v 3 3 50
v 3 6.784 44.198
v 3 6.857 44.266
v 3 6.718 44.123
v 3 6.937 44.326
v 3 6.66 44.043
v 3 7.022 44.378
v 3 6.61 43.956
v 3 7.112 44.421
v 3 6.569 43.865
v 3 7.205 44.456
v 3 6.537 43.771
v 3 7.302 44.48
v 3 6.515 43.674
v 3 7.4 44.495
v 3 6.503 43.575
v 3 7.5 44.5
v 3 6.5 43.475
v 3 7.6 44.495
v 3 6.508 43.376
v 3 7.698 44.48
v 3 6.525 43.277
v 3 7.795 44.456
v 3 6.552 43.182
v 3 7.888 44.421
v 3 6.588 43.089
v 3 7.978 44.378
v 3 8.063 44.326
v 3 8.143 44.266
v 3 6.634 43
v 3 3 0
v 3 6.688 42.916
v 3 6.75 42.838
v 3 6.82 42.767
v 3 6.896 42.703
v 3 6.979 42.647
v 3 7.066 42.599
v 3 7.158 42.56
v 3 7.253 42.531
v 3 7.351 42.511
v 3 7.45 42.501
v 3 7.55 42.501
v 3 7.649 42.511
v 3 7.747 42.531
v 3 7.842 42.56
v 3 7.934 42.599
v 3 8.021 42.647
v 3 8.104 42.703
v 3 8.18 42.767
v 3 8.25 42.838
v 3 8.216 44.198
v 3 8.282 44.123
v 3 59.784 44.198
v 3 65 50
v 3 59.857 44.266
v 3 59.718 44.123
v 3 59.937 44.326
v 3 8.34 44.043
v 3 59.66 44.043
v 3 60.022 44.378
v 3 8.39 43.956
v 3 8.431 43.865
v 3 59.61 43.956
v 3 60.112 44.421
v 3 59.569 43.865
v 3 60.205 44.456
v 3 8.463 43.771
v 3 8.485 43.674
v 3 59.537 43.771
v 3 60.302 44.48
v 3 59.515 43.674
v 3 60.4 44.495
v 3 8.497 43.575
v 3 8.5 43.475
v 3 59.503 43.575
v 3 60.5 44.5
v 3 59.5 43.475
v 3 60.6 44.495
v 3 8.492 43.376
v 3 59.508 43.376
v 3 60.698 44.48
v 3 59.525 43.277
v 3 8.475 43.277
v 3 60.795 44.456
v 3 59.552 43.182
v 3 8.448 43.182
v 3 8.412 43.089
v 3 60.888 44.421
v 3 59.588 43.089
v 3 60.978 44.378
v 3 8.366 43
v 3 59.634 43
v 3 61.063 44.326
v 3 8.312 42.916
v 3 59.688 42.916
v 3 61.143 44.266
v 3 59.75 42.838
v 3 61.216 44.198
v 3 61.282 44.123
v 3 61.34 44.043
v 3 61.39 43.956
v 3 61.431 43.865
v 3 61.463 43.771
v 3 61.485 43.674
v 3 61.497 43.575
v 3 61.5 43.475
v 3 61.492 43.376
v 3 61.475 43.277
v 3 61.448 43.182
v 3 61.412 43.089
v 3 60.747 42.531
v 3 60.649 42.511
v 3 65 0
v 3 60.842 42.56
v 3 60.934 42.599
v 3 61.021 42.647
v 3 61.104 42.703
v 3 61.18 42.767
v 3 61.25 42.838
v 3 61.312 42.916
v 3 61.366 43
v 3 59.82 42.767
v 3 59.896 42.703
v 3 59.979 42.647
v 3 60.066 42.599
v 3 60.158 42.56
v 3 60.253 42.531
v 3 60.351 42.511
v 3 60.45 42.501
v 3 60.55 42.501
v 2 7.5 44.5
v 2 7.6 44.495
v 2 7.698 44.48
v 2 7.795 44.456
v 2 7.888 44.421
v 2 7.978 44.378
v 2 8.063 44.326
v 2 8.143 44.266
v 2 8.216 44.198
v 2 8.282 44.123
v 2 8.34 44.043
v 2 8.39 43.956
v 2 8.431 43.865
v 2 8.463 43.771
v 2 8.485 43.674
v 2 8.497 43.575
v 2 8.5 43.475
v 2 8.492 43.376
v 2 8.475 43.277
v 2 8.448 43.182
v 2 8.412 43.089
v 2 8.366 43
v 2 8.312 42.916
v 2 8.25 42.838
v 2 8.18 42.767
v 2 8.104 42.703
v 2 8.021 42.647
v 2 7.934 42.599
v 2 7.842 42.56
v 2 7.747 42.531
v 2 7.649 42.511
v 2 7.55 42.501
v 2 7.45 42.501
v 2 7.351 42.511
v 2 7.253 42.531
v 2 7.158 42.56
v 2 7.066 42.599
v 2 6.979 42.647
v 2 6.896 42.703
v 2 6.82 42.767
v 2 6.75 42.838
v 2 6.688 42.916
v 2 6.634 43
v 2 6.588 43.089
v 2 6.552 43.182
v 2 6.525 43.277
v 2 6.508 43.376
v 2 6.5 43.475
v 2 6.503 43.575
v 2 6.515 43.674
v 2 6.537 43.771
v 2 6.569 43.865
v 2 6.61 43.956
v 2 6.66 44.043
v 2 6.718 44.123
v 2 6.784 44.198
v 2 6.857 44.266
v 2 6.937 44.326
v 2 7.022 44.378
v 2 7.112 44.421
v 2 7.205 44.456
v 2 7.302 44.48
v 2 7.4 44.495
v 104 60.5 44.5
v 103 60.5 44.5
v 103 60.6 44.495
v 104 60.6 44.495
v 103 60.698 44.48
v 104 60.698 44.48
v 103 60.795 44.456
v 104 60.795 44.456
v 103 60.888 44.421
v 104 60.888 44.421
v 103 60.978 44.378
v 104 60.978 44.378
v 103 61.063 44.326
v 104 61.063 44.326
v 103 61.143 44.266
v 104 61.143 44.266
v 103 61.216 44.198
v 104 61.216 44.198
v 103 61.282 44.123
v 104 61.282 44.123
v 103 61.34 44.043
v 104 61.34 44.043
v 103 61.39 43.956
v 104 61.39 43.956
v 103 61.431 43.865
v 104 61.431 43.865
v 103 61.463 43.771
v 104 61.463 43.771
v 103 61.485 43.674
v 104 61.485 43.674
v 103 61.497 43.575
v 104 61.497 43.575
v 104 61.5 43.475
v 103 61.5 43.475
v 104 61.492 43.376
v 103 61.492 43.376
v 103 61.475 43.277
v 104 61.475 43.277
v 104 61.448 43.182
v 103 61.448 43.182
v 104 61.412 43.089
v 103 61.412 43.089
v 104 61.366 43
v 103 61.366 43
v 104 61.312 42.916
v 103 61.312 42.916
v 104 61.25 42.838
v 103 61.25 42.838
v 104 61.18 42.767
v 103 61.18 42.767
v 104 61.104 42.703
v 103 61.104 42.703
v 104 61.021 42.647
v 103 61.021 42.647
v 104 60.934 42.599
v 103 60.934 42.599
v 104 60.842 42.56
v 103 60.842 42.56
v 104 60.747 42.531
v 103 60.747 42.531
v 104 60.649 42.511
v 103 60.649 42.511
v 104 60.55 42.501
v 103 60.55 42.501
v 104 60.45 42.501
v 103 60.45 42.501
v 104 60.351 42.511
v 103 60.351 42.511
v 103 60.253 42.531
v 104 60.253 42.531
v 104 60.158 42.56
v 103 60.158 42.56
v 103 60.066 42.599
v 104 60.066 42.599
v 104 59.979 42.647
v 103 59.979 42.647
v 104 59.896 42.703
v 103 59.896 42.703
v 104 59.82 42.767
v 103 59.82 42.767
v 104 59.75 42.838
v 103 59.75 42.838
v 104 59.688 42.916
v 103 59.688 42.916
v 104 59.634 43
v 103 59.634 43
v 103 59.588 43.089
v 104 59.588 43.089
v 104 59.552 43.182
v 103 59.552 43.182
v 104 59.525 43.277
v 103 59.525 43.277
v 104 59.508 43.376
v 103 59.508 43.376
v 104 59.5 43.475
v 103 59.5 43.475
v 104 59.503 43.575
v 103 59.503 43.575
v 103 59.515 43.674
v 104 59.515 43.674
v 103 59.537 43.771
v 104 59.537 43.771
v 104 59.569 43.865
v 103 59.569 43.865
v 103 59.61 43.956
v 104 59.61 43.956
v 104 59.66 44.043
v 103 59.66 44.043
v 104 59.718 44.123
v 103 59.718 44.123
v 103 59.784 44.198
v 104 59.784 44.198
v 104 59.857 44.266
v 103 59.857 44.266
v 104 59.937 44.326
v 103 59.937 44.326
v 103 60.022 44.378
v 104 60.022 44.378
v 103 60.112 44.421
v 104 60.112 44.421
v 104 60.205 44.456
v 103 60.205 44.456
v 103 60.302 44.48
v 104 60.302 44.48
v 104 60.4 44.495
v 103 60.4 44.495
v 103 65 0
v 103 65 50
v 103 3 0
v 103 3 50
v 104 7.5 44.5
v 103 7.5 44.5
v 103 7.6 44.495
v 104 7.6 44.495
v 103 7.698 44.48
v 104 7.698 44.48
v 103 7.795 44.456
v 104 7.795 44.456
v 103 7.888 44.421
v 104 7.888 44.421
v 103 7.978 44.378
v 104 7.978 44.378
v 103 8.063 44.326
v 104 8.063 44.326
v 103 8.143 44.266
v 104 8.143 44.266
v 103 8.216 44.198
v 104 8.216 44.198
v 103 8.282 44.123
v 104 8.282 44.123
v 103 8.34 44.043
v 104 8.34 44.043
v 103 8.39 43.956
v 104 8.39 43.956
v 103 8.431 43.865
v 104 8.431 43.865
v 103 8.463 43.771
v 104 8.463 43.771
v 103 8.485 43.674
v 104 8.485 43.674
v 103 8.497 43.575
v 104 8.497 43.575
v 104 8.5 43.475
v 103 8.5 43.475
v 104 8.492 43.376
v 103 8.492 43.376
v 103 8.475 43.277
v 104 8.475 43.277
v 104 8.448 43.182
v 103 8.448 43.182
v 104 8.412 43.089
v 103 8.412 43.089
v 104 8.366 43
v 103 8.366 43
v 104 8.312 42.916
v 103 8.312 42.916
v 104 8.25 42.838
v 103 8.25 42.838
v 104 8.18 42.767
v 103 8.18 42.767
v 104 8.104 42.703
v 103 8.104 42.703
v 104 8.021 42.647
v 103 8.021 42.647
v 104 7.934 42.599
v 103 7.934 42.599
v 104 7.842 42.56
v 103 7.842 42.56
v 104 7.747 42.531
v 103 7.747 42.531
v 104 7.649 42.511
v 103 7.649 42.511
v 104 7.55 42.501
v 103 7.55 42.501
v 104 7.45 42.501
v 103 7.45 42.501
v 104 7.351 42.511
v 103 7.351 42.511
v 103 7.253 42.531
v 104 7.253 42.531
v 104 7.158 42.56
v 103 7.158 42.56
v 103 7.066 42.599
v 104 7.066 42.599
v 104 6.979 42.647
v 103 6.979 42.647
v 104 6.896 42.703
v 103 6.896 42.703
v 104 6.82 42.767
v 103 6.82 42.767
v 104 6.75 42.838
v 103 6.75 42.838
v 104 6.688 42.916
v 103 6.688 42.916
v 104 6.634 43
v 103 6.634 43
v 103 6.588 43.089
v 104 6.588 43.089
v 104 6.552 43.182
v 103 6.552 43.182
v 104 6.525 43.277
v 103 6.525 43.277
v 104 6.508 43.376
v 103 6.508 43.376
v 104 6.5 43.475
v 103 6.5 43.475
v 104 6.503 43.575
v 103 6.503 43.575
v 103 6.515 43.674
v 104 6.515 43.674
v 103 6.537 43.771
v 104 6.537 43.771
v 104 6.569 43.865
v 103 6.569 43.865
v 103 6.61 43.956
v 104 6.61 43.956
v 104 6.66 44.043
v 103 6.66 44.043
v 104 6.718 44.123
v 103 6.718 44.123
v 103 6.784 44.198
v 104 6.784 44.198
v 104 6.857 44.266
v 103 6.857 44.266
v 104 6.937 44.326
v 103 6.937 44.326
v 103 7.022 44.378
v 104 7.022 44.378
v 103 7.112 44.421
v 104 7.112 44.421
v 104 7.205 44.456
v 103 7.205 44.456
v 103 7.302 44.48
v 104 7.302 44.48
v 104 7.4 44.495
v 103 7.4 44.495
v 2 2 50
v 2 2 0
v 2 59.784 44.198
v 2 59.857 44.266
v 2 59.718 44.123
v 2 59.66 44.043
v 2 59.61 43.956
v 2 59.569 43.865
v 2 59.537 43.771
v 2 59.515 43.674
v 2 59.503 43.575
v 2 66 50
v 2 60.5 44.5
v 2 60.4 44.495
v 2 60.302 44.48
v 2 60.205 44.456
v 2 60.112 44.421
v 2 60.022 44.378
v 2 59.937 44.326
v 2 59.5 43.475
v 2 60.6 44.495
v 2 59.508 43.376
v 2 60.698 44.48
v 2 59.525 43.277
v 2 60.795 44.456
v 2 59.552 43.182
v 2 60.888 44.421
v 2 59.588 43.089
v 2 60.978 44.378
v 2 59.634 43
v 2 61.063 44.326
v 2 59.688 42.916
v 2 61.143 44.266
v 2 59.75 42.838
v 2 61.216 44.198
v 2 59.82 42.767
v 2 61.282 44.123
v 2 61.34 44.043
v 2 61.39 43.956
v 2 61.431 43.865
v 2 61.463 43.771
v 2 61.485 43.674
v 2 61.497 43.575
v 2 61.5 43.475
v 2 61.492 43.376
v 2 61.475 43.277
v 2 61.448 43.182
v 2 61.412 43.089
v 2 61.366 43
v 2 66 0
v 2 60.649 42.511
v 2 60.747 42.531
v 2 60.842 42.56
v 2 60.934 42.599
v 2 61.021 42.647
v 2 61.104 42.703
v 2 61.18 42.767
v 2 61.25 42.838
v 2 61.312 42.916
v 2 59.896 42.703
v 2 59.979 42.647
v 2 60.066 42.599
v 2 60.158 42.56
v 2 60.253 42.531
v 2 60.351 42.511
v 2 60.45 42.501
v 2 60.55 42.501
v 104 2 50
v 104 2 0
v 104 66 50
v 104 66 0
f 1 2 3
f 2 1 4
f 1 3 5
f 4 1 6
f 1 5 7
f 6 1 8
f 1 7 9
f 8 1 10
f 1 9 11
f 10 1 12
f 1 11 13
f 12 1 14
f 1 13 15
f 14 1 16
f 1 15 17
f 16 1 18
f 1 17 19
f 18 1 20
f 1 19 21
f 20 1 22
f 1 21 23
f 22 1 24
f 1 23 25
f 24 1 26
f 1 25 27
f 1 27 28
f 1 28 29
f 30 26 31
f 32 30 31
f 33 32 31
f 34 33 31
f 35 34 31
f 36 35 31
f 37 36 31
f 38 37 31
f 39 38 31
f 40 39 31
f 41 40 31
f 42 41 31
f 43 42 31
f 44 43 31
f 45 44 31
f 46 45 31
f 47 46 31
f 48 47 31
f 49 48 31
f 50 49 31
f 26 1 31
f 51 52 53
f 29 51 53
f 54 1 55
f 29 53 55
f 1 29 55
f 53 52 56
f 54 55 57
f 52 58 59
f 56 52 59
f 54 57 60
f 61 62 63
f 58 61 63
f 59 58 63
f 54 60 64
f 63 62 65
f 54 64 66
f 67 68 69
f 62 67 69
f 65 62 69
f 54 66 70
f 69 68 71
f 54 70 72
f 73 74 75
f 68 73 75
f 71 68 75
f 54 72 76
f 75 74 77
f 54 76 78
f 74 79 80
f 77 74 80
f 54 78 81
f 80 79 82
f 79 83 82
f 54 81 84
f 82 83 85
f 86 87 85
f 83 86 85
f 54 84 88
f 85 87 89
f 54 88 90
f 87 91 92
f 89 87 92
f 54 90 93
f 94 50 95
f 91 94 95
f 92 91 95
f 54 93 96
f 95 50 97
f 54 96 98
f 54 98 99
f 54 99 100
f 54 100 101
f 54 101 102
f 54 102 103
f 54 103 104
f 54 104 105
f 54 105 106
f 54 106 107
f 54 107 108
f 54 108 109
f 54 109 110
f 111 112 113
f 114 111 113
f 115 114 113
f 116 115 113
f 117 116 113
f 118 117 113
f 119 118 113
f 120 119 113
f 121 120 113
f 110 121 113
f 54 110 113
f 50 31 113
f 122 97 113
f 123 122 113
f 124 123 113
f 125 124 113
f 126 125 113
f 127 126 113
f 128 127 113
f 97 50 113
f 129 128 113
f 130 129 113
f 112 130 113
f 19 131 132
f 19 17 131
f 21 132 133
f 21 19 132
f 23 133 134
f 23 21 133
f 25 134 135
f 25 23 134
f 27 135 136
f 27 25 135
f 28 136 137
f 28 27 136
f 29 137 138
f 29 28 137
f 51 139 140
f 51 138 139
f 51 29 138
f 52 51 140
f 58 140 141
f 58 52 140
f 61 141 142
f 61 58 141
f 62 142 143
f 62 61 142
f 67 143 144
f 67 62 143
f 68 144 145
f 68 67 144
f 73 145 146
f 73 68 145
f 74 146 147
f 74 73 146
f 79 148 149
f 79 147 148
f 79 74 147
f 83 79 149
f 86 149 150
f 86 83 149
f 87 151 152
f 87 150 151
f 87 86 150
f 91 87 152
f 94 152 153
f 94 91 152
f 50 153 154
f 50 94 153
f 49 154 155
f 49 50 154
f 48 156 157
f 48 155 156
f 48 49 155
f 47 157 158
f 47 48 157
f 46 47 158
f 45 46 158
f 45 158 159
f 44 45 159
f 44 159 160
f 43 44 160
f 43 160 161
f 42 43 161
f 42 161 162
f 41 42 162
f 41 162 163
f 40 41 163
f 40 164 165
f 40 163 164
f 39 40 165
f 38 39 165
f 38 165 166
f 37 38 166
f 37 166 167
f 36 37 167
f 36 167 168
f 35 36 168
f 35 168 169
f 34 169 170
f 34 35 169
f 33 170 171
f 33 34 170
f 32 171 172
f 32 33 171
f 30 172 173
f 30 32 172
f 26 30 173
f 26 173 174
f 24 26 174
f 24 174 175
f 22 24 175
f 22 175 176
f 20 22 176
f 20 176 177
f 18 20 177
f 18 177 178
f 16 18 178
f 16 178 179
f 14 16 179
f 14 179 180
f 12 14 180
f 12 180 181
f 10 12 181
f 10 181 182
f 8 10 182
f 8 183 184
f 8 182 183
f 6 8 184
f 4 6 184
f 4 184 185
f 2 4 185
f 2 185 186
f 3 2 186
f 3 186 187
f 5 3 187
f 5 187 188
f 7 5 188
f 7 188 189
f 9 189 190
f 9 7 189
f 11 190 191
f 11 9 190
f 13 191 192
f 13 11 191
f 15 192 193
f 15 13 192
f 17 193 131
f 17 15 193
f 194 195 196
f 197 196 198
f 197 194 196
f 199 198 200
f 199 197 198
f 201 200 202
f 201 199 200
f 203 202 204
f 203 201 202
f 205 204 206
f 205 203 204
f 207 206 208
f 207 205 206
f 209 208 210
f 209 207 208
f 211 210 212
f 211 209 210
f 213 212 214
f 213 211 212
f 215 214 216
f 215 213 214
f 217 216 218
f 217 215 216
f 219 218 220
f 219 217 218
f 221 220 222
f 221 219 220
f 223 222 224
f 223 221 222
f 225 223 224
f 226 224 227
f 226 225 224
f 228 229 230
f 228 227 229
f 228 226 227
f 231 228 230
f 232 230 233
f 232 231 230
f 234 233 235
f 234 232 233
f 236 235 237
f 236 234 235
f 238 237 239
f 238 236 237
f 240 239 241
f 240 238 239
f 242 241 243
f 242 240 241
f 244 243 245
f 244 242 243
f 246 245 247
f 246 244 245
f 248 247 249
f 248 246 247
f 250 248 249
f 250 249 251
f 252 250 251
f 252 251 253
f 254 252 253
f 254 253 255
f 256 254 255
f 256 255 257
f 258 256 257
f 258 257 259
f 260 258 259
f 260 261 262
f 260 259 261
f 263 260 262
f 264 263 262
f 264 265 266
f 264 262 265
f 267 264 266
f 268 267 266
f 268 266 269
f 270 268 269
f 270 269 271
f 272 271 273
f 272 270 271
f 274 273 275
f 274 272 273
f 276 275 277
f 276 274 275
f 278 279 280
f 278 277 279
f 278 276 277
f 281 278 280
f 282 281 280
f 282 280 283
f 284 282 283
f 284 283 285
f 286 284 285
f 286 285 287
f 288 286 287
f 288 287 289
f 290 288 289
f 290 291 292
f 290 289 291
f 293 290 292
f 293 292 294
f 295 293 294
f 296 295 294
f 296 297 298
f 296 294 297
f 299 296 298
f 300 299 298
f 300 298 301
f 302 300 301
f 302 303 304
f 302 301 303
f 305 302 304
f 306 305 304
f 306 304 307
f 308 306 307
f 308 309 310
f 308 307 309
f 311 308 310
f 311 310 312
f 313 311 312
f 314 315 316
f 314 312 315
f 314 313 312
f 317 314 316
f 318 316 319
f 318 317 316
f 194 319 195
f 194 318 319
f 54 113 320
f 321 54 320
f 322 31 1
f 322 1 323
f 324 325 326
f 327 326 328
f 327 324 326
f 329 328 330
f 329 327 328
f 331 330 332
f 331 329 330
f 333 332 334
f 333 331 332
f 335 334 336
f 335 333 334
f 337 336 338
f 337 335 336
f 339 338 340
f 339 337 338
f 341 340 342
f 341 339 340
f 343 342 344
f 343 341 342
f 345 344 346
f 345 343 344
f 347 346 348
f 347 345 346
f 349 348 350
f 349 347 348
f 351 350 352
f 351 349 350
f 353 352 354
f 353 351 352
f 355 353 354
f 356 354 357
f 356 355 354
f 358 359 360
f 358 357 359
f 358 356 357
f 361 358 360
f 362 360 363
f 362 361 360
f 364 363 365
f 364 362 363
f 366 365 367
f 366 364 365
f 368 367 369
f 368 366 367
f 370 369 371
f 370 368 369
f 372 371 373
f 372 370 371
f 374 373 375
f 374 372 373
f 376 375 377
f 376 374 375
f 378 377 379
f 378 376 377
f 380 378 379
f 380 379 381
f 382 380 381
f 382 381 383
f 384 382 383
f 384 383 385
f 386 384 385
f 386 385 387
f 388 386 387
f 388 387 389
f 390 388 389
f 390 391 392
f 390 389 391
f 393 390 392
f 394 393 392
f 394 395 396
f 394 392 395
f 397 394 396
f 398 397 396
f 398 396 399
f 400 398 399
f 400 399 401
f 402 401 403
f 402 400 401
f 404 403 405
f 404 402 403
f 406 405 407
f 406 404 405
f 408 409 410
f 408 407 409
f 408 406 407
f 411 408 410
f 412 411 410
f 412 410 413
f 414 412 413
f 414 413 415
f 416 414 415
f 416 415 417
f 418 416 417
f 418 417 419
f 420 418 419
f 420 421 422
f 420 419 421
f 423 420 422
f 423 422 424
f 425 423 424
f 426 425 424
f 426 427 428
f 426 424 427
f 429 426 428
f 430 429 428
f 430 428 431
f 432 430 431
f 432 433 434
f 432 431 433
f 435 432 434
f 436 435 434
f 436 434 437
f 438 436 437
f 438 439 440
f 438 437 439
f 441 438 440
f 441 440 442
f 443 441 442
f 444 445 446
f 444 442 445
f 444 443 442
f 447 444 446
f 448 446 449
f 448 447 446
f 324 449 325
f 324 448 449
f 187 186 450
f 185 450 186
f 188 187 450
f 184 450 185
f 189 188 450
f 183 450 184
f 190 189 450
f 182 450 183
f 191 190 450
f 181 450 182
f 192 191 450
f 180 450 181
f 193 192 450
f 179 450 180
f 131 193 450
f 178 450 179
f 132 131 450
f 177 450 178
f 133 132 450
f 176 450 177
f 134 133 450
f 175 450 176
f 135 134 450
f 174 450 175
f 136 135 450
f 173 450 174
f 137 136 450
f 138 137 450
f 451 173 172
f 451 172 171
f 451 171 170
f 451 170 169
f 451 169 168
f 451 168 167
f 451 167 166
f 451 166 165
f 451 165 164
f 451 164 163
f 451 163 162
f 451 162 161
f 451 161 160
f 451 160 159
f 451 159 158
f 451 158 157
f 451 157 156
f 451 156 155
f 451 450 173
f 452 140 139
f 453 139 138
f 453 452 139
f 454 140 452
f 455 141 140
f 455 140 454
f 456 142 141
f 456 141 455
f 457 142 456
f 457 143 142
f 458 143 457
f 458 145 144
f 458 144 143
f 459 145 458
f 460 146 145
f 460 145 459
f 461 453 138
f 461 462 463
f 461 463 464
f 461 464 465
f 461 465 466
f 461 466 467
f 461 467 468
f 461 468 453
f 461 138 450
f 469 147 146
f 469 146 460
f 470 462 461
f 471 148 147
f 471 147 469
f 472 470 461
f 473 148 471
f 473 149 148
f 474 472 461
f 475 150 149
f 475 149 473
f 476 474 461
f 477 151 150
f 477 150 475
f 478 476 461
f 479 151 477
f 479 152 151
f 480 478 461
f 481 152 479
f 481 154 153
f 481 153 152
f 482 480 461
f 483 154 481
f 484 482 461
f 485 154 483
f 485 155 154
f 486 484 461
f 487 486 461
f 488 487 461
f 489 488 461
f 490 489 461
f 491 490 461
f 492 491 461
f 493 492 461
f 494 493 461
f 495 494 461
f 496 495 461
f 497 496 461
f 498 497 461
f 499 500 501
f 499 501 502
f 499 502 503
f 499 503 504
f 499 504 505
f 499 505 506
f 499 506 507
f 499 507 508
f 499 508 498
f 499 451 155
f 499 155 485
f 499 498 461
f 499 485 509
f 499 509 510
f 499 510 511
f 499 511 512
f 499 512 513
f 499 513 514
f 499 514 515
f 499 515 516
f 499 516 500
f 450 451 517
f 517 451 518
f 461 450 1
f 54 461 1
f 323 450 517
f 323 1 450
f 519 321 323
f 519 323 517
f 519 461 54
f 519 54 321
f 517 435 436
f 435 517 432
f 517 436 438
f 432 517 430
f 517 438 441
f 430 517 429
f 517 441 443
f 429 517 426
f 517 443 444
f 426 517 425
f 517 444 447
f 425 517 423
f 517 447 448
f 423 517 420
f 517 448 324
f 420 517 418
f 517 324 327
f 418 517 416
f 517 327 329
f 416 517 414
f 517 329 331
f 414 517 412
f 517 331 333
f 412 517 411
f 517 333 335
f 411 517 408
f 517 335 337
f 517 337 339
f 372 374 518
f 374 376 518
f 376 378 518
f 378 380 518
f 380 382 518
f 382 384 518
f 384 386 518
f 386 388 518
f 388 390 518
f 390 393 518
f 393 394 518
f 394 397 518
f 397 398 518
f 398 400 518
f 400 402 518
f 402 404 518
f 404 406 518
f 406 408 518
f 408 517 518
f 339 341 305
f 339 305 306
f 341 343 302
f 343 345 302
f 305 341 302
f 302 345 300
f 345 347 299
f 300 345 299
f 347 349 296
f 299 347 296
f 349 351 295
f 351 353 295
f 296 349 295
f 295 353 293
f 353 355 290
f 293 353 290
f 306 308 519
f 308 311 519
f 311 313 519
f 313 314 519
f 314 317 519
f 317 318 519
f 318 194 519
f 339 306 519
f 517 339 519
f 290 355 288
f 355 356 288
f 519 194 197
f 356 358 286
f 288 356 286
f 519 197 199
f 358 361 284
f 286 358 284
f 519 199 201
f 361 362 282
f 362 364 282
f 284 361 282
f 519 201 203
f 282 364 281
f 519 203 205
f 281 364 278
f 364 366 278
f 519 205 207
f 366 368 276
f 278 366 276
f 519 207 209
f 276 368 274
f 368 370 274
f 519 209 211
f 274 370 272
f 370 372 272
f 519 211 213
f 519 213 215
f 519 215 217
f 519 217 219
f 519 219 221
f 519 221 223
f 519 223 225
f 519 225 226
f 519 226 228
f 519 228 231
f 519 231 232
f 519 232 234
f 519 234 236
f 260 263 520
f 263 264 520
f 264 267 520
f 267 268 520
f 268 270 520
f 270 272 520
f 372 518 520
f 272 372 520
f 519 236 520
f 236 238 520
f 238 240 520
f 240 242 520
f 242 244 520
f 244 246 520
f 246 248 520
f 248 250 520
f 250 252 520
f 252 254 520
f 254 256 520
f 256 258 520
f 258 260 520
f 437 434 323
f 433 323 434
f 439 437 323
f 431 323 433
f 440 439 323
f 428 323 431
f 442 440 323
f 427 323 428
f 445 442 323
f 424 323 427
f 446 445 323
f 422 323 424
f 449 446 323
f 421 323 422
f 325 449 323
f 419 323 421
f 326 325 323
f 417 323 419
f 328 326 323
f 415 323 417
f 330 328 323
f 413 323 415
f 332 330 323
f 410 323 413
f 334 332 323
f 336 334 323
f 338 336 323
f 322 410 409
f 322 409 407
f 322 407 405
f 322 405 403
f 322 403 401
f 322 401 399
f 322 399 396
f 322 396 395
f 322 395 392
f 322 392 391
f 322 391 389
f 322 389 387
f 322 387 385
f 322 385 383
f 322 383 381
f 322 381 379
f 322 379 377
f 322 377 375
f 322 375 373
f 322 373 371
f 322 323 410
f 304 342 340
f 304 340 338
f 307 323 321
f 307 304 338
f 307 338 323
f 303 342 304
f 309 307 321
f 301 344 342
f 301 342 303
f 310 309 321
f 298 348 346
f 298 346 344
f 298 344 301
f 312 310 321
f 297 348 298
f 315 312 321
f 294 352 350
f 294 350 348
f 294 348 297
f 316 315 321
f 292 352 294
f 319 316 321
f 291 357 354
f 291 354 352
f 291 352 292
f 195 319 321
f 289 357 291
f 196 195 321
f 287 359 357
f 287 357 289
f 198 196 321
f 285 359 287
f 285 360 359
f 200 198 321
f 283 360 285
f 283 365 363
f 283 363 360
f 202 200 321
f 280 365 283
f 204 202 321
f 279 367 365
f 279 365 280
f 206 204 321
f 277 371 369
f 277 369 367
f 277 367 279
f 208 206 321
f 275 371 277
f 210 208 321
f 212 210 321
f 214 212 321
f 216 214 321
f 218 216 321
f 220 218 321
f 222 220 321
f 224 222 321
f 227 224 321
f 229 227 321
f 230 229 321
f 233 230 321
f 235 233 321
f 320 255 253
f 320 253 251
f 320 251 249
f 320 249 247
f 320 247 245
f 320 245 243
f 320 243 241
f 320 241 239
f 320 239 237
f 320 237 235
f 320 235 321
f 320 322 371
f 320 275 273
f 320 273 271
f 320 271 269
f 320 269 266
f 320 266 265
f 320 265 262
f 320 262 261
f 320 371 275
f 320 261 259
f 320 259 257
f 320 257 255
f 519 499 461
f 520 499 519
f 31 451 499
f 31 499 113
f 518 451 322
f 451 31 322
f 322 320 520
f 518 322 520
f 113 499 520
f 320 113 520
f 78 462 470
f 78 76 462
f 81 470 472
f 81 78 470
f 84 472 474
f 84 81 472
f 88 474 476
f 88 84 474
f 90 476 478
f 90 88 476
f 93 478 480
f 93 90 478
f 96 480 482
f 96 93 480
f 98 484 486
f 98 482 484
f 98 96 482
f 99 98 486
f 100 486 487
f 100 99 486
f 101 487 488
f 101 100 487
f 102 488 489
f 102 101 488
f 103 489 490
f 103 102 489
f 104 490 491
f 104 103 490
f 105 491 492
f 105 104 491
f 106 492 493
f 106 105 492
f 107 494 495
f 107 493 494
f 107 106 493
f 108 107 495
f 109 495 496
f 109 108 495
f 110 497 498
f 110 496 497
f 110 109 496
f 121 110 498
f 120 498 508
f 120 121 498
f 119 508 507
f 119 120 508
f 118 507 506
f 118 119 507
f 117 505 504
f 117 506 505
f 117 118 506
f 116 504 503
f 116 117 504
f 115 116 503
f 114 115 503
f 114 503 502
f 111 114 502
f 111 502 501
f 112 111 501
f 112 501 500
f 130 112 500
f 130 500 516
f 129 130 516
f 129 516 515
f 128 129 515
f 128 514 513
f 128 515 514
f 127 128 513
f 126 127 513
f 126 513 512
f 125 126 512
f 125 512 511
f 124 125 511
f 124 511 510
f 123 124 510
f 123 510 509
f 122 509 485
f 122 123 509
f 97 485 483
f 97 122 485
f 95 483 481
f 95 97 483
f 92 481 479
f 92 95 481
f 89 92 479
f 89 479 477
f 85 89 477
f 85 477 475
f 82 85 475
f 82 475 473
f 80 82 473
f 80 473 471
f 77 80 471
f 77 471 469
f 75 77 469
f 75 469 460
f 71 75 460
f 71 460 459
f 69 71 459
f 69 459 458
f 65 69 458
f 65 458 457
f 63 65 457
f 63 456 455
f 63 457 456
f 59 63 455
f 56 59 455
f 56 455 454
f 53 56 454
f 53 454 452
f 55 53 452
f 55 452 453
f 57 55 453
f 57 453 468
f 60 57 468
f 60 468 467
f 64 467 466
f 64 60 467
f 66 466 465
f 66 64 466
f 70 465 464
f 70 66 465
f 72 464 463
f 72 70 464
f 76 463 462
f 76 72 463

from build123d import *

# Parameters (mm, degrees)
SKETCH_1_W               = 102
SKETCH_1_H               = 64
SKETCH_1_W_2             = 100
SKETCH_1_H_2             = 62
EXTRUDE_1_DEPTH          = 50
CUT_EXTRUDE_2_DEPTH      = 102
CUT_EXTRUDE_2_DEPTH_BACK = 1
SKETCH_5_R               = 1


with BuildPart() as part:
    # Эскиз1 → Бобышка-Вытянуть1 (new body)
    with BuildSketch(Plane.XY):
        with Locations((53, 34)):
            Rectangle(SKETCH_1_W, SKETCH_1_H)
        with Locations((53, 34)):
            Rectangle(SKETCH_1_W_2, SKETCH_1_H_2, mode=Mode.SUBTRACT)
    extrude(amount=EXTRUDE_1_DEPTH)

    # Эскиз5 → Вырез-Вытянуть2 (cut, two sides: drawn at the far end of the back side and taken through both)
    with BuildSketch(Plane.ZY.offset(-103).offset(-CUT_EXTRUDE_2_DEPTH_BACK)):
        with Locations((43.5, 7.5)):
            Circle(SKETCH_5_R)
        with Locations((43.5, 60.5)):
            Circle(SKETCH_5_R)
    extrude(amount=CUT_EXTRUDE_2_DEPTH + CUT_EXTRUDE_2_DEPTH_BACK, mode=Mode.SUBTRACT)


solid = part.part
